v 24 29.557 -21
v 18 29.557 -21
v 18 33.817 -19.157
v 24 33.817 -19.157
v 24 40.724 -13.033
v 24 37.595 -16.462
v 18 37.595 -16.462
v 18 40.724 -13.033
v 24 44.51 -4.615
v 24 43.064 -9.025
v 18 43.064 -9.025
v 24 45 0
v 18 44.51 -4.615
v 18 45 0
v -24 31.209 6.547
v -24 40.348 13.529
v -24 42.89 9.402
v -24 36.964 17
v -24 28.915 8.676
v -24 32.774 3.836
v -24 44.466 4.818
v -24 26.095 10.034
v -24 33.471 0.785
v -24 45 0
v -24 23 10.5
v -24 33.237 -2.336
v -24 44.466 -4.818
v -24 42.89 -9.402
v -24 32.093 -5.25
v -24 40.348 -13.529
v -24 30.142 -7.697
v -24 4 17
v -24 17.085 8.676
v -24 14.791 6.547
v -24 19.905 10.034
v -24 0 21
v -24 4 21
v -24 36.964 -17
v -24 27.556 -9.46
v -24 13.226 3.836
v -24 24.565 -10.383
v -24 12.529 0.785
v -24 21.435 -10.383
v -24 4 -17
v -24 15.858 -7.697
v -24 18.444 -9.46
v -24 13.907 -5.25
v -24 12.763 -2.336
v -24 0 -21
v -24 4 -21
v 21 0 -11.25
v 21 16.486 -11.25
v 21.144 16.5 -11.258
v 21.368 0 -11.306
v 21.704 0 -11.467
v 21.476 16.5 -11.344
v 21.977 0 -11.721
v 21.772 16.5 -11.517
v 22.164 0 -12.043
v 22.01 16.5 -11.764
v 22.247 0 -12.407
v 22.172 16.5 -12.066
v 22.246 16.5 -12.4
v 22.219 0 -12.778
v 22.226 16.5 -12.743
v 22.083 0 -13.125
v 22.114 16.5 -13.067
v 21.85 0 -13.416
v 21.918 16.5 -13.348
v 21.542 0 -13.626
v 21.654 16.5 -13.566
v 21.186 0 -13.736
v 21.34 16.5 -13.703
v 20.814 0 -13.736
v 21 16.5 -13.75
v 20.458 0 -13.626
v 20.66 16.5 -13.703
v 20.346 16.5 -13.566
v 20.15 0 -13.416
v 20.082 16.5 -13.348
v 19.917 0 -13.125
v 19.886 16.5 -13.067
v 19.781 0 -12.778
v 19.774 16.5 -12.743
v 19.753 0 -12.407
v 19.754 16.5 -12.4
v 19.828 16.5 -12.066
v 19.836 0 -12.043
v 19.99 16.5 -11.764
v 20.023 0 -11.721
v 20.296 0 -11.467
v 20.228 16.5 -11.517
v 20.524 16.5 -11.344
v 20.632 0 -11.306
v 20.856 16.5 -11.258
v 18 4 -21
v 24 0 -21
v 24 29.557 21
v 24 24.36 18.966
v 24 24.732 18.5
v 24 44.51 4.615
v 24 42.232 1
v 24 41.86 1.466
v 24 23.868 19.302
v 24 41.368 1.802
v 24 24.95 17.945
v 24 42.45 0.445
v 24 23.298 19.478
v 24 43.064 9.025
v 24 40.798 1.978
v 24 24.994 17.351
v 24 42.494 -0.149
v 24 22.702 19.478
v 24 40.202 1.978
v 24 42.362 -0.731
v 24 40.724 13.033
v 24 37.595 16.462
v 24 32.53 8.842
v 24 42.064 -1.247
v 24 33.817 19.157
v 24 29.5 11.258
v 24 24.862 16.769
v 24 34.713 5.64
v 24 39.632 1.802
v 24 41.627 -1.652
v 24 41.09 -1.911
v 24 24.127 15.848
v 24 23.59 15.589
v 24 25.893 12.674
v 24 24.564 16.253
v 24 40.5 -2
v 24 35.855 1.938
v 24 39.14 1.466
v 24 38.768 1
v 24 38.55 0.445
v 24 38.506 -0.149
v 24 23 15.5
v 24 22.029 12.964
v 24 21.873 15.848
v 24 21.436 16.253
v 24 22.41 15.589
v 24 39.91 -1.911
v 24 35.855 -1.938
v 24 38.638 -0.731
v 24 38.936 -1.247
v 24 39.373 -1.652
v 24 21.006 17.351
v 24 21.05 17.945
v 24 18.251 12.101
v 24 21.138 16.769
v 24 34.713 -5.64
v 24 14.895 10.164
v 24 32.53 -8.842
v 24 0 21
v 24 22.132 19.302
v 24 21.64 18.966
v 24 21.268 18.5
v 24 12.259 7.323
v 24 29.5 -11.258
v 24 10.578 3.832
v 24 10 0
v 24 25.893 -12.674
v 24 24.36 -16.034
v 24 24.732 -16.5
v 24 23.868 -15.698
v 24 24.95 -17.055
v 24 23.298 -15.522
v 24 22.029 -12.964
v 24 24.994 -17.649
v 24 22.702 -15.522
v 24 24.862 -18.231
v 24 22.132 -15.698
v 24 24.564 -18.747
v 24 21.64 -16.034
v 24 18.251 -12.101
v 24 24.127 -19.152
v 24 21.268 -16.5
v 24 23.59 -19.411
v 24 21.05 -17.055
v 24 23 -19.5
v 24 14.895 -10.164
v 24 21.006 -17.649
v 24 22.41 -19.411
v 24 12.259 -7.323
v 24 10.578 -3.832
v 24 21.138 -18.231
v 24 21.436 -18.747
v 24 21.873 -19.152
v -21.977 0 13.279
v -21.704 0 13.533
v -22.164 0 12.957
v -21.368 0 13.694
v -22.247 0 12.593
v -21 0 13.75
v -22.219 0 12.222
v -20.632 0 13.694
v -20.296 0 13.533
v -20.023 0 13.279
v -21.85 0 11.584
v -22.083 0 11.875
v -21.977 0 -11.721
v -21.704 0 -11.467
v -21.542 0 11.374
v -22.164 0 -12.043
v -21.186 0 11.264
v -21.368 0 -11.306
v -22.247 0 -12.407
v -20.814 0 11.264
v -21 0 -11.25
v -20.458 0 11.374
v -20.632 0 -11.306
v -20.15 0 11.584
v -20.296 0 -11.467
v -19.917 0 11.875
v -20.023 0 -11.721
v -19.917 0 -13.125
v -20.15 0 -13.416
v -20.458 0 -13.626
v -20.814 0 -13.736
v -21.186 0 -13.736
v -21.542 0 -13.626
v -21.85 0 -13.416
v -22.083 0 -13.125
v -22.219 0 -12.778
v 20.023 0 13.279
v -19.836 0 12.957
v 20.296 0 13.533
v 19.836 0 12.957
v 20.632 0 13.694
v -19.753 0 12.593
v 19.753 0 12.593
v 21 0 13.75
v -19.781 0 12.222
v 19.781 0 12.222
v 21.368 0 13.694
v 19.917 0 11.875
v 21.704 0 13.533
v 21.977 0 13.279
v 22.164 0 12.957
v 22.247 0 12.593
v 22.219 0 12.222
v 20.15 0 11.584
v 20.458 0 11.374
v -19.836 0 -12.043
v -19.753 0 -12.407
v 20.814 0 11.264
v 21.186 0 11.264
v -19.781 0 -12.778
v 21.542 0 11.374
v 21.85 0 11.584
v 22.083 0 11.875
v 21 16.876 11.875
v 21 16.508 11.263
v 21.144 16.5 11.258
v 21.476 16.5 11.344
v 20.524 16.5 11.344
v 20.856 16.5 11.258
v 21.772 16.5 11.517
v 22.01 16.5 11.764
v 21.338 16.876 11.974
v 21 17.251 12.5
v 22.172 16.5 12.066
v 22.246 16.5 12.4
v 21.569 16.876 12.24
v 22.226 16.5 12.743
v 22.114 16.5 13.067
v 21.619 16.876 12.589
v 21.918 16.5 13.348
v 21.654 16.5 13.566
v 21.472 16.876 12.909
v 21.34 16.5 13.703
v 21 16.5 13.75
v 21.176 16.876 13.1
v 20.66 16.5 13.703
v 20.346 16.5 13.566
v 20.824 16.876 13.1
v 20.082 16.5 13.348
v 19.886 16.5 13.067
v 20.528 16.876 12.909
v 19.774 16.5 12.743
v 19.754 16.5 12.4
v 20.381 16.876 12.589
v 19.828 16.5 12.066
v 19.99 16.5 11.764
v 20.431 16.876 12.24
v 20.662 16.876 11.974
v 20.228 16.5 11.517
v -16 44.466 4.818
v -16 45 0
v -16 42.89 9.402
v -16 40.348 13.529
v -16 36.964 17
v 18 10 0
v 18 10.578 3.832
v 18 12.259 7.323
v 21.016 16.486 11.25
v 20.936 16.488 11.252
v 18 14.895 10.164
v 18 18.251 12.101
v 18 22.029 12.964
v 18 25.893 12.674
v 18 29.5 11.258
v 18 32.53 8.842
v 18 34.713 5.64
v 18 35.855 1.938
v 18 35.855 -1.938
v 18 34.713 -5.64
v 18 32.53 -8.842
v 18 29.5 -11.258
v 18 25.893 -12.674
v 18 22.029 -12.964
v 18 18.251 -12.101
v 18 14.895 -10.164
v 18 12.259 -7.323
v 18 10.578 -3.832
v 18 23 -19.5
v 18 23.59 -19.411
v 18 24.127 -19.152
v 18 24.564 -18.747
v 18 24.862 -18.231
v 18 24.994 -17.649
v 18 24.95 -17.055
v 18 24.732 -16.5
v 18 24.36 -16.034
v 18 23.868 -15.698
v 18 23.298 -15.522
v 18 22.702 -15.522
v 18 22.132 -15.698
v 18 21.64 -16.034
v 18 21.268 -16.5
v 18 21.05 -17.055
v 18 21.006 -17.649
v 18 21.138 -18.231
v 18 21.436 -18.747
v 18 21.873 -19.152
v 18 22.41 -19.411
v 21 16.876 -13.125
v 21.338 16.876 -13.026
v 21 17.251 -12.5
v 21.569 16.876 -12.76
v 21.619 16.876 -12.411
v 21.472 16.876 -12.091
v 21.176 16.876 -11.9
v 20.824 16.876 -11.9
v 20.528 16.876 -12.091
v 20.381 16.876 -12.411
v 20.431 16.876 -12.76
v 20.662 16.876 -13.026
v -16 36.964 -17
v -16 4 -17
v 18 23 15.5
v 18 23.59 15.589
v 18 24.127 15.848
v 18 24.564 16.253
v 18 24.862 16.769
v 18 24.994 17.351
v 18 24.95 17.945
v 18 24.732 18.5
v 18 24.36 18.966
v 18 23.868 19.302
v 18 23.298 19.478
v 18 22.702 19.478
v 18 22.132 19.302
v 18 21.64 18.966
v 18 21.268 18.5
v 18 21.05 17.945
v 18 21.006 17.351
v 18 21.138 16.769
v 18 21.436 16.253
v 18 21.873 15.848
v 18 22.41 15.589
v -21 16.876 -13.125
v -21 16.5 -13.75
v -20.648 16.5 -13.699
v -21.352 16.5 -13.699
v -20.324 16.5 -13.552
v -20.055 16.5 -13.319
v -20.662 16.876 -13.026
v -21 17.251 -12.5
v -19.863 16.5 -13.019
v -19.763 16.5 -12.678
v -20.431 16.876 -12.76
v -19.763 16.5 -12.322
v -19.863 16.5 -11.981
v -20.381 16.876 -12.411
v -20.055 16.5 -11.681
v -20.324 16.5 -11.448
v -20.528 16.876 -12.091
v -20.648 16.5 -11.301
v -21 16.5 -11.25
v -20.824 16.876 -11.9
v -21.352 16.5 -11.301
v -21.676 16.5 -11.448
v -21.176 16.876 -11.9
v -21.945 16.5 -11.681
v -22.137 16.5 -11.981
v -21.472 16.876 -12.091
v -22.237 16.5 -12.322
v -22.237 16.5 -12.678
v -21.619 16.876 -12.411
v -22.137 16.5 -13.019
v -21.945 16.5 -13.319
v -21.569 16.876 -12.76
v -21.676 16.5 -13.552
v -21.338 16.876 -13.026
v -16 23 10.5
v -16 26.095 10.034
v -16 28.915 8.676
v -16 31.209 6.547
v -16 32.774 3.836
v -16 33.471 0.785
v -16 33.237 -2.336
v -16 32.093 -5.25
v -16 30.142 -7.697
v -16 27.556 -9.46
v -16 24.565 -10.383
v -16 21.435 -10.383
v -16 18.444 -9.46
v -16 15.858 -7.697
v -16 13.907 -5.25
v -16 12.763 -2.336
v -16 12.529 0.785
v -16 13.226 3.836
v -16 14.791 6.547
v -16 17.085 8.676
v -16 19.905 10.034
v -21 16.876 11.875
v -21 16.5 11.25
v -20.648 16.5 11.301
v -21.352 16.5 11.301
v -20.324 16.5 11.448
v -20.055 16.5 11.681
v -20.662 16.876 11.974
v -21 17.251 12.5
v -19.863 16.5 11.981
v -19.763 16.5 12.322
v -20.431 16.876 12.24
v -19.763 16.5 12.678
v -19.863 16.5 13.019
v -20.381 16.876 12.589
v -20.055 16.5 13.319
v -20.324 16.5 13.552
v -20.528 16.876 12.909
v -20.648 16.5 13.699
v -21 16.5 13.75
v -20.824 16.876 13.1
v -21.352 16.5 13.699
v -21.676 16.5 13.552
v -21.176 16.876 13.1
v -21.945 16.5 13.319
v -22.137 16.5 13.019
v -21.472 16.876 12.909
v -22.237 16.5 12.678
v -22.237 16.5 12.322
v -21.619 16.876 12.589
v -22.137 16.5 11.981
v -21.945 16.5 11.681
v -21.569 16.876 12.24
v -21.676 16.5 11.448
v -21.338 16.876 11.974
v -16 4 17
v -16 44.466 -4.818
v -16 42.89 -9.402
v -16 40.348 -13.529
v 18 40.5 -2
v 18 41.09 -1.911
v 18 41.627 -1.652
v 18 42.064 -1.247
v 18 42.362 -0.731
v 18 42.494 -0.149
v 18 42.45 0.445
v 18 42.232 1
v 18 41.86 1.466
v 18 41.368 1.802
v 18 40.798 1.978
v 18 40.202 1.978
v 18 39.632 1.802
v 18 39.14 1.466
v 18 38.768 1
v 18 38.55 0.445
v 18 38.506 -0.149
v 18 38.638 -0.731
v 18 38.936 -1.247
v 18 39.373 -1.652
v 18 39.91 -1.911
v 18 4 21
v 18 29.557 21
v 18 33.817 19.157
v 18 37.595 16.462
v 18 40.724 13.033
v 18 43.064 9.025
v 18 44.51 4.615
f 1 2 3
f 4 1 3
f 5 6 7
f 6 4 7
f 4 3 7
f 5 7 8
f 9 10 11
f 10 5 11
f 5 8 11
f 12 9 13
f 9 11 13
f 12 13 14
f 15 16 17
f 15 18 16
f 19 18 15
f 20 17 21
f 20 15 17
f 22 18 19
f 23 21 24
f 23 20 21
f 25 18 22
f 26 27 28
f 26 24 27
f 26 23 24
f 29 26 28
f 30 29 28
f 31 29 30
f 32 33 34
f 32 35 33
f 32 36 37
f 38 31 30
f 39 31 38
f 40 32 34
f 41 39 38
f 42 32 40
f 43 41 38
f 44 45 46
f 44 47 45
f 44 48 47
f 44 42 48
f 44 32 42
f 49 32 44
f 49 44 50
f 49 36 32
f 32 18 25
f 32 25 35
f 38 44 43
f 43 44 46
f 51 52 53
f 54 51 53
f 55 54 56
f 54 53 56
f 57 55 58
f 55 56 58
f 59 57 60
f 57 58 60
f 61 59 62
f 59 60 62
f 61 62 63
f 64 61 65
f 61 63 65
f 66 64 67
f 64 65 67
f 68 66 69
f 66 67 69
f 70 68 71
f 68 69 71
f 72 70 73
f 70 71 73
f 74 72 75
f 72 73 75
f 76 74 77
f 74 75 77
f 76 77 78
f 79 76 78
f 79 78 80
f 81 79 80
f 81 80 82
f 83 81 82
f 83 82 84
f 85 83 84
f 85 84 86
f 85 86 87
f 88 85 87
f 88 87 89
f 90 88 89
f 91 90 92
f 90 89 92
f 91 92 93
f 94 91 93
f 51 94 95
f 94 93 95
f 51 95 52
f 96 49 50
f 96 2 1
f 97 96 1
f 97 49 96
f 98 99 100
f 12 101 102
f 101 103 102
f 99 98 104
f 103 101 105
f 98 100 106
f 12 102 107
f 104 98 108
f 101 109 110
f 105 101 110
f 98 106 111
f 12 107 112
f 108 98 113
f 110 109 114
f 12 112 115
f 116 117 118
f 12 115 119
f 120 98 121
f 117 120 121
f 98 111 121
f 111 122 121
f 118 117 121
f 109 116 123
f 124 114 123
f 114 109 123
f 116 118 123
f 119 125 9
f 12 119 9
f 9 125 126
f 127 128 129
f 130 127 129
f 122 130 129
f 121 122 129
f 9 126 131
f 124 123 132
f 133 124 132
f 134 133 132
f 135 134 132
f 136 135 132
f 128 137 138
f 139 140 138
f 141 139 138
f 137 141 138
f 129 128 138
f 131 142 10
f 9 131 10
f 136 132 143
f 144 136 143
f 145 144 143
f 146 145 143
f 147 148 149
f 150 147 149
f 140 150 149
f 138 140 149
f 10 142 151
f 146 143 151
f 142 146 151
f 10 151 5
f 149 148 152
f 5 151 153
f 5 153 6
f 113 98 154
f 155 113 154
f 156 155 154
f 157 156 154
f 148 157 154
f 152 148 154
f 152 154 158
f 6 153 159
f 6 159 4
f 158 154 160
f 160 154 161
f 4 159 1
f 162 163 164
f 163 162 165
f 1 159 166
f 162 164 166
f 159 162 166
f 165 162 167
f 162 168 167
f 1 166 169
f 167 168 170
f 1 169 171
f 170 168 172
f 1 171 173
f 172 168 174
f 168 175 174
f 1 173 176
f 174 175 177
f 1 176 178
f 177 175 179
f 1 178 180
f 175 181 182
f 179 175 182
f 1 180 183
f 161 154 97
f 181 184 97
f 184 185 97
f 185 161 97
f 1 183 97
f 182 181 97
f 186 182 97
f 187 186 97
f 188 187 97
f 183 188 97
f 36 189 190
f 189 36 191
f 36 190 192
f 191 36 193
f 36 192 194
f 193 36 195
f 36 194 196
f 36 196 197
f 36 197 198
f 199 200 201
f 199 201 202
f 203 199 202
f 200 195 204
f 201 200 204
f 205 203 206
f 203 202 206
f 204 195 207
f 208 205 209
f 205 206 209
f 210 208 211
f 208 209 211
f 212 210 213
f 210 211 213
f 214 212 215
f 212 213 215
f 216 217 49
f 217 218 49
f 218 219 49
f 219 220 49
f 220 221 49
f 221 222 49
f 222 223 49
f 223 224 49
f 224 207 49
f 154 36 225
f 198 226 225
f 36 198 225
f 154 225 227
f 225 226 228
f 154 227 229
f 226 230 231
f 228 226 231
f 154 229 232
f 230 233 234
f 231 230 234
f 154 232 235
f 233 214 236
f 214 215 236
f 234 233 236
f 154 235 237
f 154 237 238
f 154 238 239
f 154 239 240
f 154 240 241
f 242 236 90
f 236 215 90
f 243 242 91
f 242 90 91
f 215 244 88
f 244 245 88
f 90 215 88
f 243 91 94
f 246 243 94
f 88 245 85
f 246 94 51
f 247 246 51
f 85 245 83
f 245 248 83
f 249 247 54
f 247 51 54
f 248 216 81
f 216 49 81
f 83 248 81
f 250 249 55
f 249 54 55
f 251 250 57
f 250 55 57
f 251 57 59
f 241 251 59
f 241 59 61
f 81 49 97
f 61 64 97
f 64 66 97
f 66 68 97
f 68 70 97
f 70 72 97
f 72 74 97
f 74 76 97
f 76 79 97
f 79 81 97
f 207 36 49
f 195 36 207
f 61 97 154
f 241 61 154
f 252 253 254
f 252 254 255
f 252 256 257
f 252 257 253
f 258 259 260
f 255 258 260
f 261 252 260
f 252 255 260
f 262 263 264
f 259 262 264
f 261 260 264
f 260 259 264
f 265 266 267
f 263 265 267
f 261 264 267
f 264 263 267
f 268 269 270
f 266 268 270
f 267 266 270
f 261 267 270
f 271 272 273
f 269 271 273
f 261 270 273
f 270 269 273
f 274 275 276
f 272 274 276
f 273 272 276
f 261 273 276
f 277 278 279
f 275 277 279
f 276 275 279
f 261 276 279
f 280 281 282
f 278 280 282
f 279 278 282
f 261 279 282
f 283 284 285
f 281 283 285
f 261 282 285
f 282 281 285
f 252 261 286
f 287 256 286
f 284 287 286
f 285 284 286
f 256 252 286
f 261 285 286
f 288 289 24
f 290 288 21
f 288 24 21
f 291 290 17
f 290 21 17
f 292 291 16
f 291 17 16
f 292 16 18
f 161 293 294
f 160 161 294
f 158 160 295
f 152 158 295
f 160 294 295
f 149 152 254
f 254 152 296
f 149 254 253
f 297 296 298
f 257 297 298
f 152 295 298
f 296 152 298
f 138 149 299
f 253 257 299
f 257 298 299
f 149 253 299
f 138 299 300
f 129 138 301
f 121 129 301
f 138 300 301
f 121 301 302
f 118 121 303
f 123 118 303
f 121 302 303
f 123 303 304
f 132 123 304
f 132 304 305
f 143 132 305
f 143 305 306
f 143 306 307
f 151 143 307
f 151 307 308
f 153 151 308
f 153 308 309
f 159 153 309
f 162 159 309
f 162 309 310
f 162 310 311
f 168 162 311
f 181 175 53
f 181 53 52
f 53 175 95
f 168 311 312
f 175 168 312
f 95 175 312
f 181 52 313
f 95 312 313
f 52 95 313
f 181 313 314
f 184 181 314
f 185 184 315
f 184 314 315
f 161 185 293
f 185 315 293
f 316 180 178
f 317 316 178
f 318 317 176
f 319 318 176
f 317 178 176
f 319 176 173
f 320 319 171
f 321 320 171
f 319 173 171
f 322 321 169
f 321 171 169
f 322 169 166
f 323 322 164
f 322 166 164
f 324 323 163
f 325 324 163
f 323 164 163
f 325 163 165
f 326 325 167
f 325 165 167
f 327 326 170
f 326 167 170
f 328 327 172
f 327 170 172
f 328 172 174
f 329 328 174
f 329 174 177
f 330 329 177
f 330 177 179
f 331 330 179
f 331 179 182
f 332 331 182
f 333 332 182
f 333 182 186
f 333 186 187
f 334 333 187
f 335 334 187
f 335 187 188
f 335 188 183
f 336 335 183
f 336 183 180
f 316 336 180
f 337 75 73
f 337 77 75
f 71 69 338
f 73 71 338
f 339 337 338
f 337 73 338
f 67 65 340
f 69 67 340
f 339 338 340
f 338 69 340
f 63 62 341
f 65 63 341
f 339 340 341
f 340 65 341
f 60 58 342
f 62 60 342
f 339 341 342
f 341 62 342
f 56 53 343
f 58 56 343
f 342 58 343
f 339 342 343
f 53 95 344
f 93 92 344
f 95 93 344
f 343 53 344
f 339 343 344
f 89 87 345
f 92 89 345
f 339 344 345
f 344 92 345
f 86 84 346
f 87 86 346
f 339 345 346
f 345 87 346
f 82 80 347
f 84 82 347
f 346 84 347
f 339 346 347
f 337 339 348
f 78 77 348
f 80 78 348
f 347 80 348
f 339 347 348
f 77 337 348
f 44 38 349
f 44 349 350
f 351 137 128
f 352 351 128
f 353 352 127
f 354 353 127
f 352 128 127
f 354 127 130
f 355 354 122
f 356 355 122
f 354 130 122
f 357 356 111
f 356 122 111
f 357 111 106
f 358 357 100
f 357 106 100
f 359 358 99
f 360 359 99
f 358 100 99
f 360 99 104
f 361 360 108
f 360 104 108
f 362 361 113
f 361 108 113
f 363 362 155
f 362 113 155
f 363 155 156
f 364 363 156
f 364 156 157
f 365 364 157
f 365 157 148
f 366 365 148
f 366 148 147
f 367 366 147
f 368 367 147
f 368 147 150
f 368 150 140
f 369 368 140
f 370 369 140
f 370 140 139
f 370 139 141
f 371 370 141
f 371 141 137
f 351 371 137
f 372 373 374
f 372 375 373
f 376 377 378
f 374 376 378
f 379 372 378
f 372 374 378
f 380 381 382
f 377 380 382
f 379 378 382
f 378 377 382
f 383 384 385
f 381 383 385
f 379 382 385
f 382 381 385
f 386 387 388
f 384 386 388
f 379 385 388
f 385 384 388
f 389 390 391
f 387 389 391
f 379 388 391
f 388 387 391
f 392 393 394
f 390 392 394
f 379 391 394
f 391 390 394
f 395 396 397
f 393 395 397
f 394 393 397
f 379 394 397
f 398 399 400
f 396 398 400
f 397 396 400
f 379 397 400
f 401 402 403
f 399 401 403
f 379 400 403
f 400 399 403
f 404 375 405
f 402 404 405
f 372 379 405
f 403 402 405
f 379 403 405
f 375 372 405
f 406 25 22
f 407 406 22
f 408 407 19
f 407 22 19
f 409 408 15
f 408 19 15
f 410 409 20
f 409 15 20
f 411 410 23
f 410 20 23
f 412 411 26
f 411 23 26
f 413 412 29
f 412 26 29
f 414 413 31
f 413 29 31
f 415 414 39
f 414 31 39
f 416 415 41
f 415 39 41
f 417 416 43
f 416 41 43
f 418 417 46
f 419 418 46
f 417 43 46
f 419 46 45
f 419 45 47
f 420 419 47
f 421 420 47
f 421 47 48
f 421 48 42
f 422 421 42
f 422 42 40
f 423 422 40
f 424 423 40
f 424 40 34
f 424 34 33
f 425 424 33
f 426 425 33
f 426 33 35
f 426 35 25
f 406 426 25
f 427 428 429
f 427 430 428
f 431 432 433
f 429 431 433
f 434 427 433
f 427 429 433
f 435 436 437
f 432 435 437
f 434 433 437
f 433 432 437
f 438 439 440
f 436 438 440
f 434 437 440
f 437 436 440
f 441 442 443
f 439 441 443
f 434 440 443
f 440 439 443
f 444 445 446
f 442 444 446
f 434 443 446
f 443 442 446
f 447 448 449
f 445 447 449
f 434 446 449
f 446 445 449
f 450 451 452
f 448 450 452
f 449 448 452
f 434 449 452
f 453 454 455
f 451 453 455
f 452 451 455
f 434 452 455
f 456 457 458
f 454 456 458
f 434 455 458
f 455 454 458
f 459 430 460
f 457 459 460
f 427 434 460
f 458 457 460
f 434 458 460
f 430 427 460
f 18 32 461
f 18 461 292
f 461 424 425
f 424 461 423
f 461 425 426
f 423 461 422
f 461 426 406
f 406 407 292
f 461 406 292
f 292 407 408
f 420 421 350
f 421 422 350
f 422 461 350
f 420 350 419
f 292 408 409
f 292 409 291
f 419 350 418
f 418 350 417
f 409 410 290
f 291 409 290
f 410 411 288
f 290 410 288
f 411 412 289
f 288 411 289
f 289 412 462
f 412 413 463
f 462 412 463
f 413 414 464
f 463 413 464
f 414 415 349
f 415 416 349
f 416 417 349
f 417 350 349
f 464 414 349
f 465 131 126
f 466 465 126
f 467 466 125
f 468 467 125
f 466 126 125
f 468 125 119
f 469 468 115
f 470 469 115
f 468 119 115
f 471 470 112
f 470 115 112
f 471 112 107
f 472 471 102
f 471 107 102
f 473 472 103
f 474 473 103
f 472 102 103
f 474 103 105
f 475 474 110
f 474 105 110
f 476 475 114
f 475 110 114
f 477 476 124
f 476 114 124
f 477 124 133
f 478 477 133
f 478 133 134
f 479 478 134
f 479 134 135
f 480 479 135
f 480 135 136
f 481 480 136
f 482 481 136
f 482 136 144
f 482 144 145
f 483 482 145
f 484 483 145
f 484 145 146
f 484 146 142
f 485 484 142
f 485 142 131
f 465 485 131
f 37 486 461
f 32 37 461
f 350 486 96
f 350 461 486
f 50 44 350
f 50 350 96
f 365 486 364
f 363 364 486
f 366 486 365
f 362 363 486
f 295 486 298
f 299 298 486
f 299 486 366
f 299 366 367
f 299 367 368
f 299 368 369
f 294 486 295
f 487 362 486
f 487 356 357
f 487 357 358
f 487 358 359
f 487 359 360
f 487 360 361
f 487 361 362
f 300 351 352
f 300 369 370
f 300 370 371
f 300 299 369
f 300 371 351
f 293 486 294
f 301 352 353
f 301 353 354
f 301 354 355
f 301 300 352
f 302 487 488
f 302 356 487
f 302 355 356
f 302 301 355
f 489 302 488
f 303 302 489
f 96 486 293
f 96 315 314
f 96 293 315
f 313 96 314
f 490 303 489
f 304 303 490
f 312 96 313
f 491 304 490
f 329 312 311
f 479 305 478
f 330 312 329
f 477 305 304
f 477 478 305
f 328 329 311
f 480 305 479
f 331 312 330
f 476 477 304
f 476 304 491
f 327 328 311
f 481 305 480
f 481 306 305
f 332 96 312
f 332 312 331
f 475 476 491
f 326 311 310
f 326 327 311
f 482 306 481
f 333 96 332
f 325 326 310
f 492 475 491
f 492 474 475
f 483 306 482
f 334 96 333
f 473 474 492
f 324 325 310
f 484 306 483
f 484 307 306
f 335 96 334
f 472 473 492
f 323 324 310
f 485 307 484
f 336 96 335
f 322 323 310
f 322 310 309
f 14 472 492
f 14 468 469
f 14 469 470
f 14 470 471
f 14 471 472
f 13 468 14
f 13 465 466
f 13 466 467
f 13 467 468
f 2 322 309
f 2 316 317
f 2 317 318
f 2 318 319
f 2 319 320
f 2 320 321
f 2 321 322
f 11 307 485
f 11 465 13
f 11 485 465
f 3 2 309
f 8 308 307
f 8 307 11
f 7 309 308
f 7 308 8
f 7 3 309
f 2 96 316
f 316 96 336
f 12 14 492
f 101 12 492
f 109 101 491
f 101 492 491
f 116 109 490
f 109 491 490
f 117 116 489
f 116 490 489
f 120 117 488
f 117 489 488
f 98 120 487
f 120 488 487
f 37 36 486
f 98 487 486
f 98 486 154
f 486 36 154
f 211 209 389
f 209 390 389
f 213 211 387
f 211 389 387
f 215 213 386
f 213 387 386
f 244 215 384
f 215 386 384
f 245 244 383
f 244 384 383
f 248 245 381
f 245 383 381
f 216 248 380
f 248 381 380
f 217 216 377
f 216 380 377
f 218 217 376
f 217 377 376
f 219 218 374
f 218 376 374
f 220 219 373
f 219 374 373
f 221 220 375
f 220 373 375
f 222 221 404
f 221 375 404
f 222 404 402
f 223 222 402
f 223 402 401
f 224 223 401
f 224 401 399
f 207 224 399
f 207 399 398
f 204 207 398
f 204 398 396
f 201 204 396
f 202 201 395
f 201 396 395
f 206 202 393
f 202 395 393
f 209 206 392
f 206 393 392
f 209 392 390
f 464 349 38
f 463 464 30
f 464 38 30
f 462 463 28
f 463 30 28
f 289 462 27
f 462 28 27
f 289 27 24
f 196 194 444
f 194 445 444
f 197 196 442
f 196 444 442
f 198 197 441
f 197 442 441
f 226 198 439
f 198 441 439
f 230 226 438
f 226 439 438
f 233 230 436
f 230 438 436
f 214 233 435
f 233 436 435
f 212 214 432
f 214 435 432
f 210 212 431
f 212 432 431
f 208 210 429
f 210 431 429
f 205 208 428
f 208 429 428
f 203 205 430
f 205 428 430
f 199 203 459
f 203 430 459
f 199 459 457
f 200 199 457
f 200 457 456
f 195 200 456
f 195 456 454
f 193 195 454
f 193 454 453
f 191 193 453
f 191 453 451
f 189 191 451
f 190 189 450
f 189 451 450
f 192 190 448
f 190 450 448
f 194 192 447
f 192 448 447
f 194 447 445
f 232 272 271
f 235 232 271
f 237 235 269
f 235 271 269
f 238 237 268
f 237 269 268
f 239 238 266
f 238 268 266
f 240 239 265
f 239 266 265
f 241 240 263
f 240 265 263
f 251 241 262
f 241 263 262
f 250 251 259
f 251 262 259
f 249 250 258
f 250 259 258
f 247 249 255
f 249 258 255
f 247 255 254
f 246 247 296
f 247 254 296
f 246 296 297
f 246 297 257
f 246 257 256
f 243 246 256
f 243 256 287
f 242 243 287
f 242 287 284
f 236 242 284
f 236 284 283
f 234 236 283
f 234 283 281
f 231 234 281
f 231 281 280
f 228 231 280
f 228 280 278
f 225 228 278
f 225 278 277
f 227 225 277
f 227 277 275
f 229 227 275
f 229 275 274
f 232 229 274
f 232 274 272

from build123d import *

# Parameters (mm, degrees)
SKETCH_1_W               = 48
SKETCH_1_H               = 42
EXTRUDE_1_DEPTH          = 45
CUT_EXTRUDE_1_DEPTH      = 56.154328933
CUT_EXTRUDE_1_DEPTH_BACK = 56.154328933
SKETCH_2_W               = 34
SKETCH_2_H               = 41
CUT_EXTRUDE_2_REACH      = 71.065
SKETCH_3_R               = 10.5
CUT_EXTRUDE_3_REACH      = 67.038
SKETCH_4_R               = 13
CUT_EXTRUDE_4_REACH      = 71.065
SKETCH_5_R               = 2
CUT_EXTRUDE_5_DEPTH      = 70.065186599
CUT_EXTRUDE_6_REACH      = 71.065
HOLE_WIZARD_M3_1_D       = 2.5
HOLE_WIZARD_M3_1_DEPTH   = 16.5
HOLE_WIZARD_M3_1_TIP     = 0.751075774


with BuildPart() as part:
    # 草图1 → 凸台-拉伸1 (new body)
    with BuildSketch(Plane(origin=(0, 0, 0), x_dir=(1, 0, 0), z_dir=(0, 1, 0))):
        Rectangle(SKETCH_1_W, SKETCH_1_H)
    extrude(amount=EXTRUDE_1_DEPTH)

    # 草图2 → 切除-拉伸1 (cut, two sides: drawn at the far end of the back side and taken through both)
    with BuildSketch(Plane.XY.offset(-CUT_EXTRUDE_1_DEPTH_BACK)):
        with Locations((1, 24.5)):
            Rectangle(SKETCH_2_W, SKETCH_2_H)
    extrude(amount=CUT_EXTRUDE_1_DEPTH + CUT_EXTRUDE_1_DEPTH_BACK, mode=Mode.SUBTRACT)

    # 草图3 → 切除-拉伸2 (cut, up to next)
    with BuildSketch(Plane.ZY.offset(24), mode=Mode.PRIVATE) as cut_extrude_2_sk1:
        with Locations((0, 23)):
            Circle(SKETCH_3_R)
    cut_extrude_2_tool1 = extrude(cut_extrude_2_sk1.sketch, amount=-CUT_EXTRUDE_2_REACH, mode=Mode.PRIVATE) & part.part
    add(cut_extrude_2_tool1.solids().sort_by_distance((-24, 23, 0))[0], mode=Mode.SUBTRACT)

    # 草图4 → 切除-拉伸3 (cut, up to next)
    with BuildSketch(Plane.ZY.offset(-18), mode=Mode.PRIVATE) as cut_extrude_3_sk1:
        with Locations(Location((0, 23, 0), (0, 0, 270))):
            Circle(SKETCH_4_R)
    cut_extrude_3_tool1 = extrude(cut_extrude_3_sk1.sketch, amount=-CUT_EXTRUDE_3_REACH, mode=Mode.PRIVATE) & part.part
    add(cut_extrude_3_tool1.solids().sort_by_distance((18, 23, 0))[0], mode=Mode.SUBTRACT)

    # 草图5 → 切除-拉伸4 (cut, up to next)
    with BuildSketch(Plane(origin=(24, 0, 0), x_dir=(0, 0, -1), z_dir=(1, 0, 0)), mode=Mode.PRIVATE) as cut_extrude_4_sk1:
        with Locations((17.5, 23)):
            Circle(SKETCH_5_R)
    cut_extrude_4_tool1 = extrude(cut_extrude_4_sk1.sketch, amount=-CUT_EXTRUDE_4_REACH, mode=Mode.PRIVATE) & part.part
    # 草图5 → 切除-拉伸4 (cut, up to next)
    with BuildSketch(Plane(origin=(24, 0, 0), x_dir=(0, 0, -1), z_dir=(1, 0, 0)), mode=Mode.PRIVATE) as cut_extrude_4_sk2:
        with Locations((-17.5, 23)):
            Circle(SKETCH_5_R)
    cut_extrude_4_tool2 = extrude(cut_extrude_4_sk2.sketch, amount=-CUT_EXTRUDE_4_REACH, mode=Mode.PRIVATE) & part.part
    # 草图5 → 切除-拉伸4 (cut, up to next)
    with BuildSketch(Plane(origin=(24, 0, 0), x_dir=(0, 0, -1), z_dir=(1, 0, 0)), mode=Mode.PRIVATE) as cut_extrude_4_sk3:
        with Locations((0, 40.5)):
            Circle(SKETCH_5_R)
    cut_extrude_4_tool3 = extrude(cut_extrude_4_sk3.sketch, amount=-CUT_EXTRUDE_4_REACH, mode=Mode.PRIVATE) & part.part
    add(cut_extrude_4_tool1.solids().sort_by_distance((24, 23, -17.5))[0], mode=Mode.SUBTRACT)
    add(cut_extrude_4_tool2.solids().sort_by_distance((24, 23, 17.5))[0], mode=Mode.SUBTRACT)
    add(cut_extrude_4_tool3.solids().sort_by_distance((24, 40.5, 0))[0], mode=Mode.SUBTRACT)

    # 草图6 → 切除-拉伸5 (cut, through all)
    with BuildSketch(Plane.ZY.offset(24)):
        with BuildLine():
            ThreePointArc((0, 45), (13.033348619, 40.723764379), (21, 29.557438524))
            Line((21, 29.557438524), (21, 45))
            Line((21, 45), (0, 45))
        make_face()
        with BuildLine():
            ThreePointArc((-21, 29.557438524), (-13.033348619, 40.723764379), (0, 45))
            Line((0, 45), (-21, 45))
            Line((-21, 45), (-21, 29.557438524))
        make_face()
    extrude(amount=-CUT_EXTRUDE_5_DEPTH, mode=Mode.SUBTRACT)

    # 草图7 → 切除-拉伸6 (cut, up to next)
    with BuildSketch(Plane.ZY.offset(24), mode=Mode.PRIVATE) as cut_extrude_6_sk1:
        with BuildLine():
            Line((-17, 36.964240044), (-17, 4))
            Line((-17, 4), (-21, 4))
            Line((-21, 4), (-21, 29.557438524))
            ThreePointArc((-21, 29.557438524), (-19.357561241, 33.453938149), (-17, 36.964240044))
        make_face()
    cut_extrude_6_tool1 = extrude(cut_extrude_6_sk1.sketch, amount=-CUT_EXTRUDE_6_REACH, mode=Mode.PRIVATE) & part.part
    # 草图7 → 切除-拉伸6 (cut, up to next)
    with BuildSketch(Plane.ZY.offset(24), mode=Mode.PRIVATE) as cut_extrude_6_sk2:
        with BuildLine():
            Line((21, 29.557438524), (21, 4))
            Line((21, 4), (17, 4))
            Line((17, 4), (17, 36.964240044))
            ThreePointArc((17, 36.964240044), (19.357561241, 33.453938149), (21, 29.557438524))
        make_face()
    cut_extrude_6_tool2 = extrude(cut_extrude_6_sk2.sketch, amount=-CUT_EXTRUDE_6_REACH, mode=Mode.PRIVATE) & part.part
    add(cut_extrude_6_tool1.solids().sort_by_distance((-24, 18.988652, -18.919979))[0], mode=Mode.SUBTRACT)
    add(cut_extrude_6_tool2.solids().sort_by_distance((-24, 18.988652, 18.919979))[0], mode=Mode.SUBTRACT)

    # M3 螺纹孔1
    with Locations(Plane(origin=(21, 0, -12.5), x_dir=(0, 0, -1), z_dir=(0, -1, 0))):
        with Locations((0, 0), (-25, 0), (-25, -42), (0, -42)):
            Hole(HOLE_WIZARD_M3_1_D / 2, depth=HOLE_WIZARD_M3_1_DEPTH)
            with Locations((0, 0, -(HOLE_WIZARD_M3_1_DEPTH + HOLE_WIZARD_M3_1_TIP / 2))):  # 118° drill point
                Cone(0, HOLE_WIZARD_M3_1_D / 2, HOLE_WIZARD_M3_1_TIP, mode=Mode.SUBTRACT)


solid = part.part
